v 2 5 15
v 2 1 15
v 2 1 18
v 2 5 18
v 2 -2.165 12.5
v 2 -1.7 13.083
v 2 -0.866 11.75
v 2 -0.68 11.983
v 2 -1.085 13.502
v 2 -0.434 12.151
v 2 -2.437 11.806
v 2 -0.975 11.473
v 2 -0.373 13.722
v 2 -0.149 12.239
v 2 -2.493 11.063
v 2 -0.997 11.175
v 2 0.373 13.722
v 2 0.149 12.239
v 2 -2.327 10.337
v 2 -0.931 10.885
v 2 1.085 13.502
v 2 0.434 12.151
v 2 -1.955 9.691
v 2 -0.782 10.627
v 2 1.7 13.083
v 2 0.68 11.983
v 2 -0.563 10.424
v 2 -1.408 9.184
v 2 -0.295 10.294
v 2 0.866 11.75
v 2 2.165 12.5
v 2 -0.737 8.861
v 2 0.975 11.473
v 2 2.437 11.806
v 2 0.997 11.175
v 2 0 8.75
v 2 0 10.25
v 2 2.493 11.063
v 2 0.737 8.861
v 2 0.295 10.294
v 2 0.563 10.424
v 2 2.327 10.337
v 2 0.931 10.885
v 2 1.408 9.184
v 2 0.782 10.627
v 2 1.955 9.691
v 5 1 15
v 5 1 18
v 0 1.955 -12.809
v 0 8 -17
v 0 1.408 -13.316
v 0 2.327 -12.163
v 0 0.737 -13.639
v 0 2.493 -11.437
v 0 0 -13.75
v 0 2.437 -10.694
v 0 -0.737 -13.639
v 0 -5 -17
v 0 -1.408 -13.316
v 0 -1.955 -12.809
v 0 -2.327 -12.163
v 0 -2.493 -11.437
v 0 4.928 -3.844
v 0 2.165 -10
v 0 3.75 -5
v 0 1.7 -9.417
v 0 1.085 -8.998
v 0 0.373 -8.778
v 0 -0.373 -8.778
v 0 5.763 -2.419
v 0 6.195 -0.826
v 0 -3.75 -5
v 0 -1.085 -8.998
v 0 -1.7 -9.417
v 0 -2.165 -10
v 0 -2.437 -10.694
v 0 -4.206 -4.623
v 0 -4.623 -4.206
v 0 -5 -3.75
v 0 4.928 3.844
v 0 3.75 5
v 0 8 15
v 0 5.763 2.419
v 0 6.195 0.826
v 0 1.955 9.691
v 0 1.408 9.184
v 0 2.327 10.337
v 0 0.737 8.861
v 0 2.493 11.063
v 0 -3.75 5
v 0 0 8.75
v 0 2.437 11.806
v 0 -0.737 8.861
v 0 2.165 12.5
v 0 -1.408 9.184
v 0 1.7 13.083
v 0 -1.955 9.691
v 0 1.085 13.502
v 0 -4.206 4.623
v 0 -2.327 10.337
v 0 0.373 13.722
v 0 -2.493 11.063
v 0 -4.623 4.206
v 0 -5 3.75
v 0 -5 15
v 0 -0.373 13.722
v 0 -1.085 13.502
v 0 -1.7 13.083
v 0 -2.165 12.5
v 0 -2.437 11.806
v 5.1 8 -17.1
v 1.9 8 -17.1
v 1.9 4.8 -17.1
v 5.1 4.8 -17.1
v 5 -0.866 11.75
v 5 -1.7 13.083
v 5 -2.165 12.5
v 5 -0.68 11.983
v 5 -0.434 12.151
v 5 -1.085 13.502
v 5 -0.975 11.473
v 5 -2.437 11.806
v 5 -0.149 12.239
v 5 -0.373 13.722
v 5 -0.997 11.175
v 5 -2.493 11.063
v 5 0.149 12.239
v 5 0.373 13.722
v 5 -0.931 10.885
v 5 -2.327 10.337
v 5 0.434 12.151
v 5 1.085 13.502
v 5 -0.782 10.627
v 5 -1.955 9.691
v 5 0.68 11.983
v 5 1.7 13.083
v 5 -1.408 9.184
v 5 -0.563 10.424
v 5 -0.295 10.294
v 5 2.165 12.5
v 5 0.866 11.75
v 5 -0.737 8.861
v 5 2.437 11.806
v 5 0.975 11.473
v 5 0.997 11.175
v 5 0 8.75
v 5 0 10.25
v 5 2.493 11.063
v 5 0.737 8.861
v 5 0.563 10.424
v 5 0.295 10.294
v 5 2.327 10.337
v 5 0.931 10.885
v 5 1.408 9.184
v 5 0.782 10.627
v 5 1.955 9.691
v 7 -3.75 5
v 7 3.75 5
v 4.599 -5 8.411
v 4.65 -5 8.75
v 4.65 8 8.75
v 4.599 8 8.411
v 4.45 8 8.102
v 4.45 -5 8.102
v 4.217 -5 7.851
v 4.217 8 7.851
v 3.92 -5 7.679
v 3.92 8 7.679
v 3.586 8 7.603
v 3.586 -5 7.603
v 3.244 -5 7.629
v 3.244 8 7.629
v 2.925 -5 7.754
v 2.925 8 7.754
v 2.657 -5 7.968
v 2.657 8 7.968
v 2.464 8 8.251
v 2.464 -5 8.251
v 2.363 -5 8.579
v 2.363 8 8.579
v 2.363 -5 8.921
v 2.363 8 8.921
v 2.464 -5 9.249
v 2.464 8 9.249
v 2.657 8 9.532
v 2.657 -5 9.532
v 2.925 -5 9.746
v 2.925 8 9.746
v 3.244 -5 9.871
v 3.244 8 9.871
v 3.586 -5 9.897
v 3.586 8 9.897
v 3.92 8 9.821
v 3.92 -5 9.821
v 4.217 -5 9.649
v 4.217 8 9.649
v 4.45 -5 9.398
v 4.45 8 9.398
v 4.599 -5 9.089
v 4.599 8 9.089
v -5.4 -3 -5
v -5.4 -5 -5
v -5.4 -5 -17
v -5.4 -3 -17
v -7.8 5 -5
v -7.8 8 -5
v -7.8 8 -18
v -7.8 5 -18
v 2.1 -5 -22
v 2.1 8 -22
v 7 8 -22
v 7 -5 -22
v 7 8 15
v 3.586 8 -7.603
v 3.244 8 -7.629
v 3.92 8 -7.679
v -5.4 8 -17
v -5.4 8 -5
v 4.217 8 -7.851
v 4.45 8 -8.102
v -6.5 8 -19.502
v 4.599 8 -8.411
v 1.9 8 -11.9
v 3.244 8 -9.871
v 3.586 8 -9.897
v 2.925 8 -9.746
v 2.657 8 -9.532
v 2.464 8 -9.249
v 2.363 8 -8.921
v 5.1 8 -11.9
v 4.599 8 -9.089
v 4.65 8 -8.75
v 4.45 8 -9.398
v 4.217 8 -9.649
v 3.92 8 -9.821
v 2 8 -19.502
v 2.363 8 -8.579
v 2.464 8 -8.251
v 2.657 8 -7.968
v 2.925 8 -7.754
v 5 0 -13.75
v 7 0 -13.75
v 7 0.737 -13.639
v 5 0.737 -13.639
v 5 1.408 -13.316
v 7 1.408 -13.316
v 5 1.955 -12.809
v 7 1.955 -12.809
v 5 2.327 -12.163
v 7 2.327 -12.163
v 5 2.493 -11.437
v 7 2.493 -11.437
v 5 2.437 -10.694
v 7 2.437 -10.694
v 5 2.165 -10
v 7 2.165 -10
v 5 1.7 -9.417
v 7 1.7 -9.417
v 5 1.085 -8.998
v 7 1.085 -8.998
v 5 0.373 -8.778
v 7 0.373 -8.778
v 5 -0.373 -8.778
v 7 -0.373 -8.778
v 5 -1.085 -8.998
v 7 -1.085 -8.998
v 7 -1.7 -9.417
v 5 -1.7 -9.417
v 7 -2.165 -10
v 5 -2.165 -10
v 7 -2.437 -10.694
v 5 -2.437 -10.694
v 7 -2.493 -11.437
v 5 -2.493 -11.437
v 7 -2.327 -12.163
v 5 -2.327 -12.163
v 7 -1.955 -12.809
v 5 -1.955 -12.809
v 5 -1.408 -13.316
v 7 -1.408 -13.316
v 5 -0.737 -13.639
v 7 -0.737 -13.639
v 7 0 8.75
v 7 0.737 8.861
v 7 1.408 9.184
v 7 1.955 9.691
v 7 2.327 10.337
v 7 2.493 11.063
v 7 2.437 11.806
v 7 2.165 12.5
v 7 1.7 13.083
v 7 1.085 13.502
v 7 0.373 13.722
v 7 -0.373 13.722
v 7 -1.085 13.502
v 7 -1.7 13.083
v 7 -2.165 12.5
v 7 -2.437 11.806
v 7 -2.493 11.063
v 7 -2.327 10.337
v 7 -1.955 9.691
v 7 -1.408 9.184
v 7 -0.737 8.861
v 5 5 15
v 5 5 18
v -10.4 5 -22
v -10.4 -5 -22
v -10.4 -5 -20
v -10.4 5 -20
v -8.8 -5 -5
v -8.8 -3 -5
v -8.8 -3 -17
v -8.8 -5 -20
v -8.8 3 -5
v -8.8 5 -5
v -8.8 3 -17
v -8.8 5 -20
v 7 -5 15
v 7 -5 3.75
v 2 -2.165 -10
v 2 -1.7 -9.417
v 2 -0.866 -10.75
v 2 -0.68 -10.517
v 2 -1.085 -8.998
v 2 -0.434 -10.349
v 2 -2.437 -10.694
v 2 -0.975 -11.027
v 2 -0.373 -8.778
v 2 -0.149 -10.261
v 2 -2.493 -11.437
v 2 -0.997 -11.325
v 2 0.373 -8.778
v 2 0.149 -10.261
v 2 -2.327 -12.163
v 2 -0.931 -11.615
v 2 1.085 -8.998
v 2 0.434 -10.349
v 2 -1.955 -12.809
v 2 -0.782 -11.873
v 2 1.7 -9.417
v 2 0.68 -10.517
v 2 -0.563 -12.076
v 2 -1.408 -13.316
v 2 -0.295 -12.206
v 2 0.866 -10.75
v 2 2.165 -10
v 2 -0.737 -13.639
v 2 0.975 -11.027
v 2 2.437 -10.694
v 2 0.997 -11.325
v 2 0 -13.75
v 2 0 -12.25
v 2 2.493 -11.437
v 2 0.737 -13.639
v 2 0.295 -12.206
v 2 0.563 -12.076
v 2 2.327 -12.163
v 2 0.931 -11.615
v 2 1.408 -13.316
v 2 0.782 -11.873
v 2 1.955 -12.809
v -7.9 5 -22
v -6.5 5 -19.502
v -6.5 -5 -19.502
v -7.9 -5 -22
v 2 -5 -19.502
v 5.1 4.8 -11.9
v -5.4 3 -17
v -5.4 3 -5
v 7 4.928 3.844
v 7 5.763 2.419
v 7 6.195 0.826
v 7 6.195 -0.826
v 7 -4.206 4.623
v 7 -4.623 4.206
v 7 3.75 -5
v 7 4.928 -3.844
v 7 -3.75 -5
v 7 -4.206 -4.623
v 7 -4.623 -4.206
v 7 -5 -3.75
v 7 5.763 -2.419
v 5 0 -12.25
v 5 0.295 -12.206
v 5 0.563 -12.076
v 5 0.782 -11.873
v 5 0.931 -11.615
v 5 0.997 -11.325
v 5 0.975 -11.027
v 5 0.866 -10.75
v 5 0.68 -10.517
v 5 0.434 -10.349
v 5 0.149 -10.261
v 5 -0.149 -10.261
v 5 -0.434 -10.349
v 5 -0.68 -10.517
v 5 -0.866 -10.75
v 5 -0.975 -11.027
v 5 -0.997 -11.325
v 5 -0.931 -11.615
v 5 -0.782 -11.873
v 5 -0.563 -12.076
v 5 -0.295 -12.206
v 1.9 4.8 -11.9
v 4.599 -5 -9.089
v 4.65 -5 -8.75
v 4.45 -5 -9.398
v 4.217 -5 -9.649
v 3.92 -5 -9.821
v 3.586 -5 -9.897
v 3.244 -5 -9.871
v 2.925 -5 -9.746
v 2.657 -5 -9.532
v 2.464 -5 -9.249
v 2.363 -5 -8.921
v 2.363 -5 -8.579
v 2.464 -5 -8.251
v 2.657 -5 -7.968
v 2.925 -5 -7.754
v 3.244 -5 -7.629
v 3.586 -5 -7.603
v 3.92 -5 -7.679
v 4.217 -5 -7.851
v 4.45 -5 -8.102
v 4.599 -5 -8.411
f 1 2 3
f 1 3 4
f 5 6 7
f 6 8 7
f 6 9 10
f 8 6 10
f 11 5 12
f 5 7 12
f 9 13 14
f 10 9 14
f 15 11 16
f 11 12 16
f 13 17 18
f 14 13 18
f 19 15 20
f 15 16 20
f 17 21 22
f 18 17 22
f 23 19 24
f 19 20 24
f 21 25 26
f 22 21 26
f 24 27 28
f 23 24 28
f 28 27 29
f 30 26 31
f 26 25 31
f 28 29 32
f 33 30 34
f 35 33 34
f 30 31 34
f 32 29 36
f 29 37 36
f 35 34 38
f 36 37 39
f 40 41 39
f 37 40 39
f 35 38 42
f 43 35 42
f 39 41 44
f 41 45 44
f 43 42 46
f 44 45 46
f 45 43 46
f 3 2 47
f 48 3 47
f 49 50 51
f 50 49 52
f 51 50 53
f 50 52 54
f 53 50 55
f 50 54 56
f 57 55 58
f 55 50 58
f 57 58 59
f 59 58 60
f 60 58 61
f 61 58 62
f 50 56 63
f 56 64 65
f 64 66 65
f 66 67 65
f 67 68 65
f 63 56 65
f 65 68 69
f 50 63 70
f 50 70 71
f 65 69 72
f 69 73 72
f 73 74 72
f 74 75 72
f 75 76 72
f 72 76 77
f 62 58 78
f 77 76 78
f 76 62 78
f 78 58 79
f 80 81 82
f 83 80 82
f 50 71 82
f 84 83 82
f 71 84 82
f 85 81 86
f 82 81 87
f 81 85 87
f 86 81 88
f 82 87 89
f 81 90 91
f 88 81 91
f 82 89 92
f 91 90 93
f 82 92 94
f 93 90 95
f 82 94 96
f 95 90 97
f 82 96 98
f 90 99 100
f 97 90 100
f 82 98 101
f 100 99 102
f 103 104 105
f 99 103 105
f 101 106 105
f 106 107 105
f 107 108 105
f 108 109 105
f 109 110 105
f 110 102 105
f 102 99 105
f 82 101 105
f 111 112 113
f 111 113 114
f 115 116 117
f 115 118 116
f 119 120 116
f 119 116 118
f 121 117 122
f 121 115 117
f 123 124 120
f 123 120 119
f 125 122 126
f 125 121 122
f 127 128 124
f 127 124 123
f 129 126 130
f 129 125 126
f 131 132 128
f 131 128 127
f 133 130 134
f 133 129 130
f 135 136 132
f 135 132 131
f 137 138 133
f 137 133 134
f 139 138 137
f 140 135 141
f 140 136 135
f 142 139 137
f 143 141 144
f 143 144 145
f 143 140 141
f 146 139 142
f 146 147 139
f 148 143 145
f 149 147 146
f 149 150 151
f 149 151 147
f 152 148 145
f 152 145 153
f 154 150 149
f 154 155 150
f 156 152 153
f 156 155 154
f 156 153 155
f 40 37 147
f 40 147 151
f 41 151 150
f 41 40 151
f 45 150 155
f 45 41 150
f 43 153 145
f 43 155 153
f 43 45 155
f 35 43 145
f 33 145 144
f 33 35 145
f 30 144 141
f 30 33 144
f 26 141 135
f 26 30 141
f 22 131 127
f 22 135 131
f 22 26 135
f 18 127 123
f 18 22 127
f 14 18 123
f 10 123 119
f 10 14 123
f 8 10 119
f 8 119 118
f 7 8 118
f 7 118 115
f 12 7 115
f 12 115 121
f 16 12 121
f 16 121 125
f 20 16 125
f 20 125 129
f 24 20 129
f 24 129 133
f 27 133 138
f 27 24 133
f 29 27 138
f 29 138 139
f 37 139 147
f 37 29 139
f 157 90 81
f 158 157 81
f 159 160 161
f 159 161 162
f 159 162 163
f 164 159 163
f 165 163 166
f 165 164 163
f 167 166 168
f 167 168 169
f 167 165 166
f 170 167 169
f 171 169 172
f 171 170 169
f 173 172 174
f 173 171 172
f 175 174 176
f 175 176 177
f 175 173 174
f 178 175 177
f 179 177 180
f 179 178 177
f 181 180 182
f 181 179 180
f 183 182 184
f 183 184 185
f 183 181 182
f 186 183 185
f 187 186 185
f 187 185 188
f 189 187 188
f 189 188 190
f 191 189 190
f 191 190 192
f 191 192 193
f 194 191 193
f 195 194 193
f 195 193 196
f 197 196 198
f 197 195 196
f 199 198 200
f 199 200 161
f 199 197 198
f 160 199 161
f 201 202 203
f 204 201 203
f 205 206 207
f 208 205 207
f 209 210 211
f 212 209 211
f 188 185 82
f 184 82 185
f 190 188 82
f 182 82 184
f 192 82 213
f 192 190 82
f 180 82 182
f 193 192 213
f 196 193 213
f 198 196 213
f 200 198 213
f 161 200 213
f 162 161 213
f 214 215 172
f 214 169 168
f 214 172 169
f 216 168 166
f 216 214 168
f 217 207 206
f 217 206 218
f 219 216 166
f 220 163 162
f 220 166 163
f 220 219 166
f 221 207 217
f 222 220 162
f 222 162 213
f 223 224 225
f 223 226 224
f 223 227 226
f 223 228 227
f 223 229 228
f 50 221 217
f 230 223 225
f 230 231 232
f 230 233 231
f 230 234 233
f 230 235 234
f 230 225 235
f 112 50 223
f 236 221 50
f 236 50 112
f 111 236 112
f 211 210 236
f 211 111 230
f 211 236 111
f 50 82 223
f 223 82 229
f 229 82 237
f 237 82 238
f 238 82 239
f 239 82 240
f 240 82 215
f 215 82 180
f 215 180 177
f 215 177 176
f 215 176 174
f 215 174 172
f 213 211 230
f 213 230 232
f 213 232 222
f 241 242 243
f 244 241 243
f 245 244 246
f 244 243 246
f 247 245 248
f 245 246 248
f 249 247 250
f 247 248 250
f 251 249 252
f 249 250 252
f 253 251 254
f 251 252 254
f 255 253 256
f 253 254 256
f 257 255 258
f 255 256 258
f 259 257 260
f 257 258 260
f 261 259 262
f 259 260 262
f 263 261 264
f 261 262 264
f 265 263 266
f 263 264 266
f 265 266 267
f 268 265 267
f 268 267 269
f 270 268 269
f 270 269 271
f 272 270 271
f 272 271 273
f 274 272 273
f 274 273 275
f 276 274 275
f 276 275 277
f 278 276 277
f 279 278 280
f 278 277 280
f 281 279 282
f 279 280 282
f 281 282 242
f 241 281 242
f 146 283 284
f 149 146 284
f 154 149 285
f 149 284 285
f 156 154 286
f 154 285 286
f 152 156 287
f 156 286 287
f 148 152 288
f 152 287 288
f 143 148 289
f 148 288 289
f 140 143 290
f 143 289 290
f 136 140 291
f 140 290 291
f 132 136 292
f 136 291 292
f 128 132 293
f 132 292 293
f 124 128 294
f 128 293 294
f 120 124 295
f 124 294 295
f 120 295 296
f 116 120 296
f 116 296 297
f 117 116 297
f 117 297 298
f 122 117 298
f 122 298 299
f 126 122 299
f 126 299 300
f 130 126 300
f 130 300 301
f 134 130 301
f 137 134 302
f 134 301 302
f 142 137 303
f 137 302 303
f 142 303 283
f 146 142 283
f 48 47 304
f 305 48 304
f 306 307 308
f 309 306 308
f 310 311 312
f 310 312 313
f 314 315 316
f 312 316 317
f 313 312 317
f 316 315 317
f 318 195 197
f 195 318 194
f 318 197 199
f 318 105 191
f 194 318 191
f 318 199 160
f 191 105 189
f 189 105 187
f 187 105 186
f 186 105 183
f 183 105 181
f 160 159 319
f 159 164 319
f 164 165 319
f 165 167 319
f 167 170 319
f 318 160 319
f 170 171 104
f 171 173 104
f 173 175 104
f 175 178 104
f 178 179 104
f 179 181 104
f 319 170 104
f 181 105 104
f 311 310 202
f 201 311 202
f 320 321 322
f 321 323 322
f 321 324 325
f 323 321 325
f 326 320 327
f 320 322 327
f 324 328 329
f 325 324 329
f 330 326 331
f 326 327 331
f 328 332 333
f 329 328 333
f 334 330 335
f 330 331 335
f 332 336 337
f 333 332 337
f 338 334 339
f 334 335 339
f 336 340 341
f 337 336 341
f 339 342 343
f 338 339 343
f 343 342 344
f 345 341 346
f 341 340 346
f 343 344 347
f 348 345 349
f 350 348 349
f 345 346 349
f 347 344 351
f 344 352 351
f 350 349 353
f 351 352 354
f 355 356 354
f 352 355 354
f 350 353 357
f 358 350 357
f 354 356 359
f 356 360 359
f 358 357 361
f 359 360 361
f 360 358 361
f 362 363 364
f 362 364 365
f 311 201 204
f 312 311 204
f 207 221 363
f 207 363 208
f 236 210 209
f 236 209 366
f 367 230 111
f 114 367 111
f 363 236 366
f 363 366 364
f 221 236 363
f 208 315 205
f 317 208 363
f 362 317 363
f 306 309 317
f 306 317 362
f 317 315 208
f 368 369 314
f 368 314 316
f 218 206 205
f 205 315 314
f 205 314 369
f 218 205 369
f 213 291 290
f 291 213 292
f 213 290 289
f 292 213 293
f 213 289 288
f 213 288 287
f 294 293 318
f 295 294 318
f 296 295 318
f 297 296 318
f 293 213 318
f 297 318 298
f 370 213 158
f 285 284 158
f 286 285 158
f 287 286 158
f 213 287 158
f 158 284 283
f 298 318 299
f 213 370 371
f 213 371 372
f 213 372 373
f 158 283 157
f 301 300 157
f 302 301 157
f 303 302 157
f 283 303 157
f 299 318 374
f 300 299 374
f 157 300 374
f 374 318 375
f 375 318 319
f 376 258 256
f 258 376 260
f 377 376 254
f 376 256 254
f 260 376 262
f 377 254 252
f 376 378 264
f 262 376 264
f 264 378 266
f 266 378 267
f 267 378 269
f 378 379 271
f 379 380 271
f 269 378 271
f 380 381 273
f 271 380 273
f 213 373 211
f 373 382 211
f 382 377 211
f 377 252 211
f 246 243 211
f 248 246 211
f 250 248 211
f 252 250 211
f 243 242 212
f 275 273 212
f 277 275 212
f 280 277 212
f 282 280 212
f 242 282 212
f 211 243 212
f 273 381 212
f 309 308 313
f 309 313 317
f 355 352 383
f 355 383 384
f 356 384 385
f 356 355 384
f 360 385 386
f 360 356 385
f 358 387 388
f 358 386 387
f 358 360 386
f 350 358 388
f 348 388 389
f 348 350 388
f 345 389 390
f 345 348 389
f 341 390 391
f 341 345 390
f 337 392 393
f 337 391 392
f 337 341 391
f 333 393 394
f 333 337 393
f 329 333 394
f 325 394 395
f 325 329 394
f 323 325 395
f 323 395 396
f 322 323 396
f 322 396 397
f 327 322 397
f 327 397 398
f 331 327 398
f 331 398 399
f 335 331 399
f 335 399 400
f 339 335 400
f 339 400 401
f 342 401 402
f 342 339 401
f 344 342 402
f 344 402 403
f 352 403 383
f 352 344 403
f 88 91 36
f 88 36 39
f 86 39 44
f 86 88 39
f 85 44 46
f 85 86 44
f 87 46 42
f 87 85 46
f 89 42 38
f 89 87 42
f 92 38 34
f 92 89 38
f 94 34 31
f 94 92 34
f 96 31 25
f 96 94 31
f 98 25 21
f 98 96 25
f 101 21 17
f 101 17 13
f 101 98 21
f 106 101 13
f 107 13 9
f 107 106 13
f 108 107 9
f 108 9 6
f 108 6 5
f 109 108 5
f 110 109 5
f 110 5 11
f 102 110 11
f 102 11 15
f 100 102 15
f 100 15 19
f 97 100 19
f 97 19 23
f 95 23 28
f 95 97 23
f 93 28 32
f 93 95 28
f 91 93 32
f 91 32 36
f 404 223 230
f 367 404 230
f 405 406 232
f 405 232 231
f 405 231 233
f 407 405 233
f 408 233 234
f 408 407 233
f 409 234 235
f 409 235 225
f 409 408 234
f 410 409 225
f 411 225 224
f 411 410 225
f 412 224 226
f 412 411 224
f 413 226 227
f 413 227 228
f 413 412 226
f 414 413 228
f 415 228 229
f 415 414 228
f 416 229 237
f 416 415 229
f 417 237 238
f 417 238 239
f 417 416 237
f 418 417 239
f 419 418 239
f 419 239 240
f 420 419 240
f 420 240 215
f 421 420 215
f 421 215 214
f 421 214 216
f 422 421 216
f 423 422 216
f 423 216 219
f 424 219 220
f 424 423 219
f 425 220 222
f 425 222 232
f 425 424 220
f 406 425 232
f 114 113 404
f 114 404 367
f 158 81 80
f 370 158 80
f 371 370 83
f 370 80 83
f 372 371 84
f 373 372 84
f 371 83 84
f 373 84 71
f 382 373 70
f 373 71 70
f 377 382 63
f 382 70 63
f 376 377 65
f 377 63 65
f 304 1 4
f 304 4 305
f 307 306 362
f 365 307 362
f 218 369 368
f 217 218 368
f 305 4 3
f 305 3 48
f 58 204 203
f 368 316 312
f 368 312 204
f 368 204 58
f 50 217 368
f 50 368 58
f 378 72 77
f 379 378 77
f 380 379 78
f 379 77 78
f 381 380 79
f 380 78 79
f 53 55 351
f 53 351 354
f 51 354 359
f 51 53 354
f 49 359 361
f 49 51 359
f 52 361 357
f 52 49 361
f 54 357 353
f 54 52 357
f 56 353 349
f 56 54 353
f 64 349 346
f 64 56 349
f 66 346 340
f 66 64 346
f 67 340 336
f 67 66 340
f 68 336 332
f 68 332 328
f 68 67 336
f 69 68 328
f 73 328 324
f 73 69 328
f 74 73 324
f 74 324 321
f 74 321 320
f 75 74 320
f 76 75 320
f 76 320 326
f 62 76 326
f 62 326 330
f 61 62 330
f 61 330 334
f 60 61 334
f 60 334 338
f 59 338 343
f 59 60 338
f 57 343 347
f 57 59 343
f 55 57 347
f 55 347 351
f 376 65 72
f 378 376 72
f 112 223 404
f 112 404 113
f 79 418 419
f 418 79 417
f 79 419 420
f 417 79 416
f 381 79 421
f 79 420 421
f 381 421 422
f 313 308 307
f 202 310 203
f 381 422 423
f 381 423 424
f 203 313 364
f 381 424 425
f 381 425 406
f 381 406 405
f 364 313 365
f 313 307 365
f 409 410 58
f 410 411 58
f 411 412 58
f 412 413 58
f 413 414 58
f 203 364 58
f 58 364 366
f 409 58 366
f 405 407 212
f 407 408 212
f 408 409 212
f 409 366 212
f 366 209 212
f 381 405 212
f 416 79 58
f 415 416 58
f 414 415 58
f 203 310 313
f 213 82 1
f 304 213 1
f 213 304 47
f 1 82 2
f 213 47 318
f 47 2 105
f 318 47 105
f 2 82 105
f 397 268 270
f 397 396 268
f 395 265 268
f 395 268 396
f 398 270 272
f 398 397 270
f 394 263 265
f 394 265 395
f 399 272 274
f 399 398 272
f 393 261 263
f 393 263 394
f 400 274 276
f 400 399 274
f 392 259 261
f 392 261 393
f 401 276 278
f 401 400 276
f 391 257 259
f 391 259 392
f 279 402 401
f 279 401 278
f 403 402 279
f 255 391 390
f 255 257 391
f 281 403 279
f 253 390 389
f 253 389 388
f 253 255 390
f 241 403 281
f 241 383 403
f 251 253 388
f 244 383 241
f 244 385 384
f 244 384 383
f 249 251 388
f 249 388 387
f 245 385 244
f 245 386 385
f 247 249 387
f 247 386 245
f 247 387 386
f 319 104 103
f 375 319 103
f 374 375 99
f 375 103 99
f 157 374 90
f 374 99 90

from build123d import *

# Parameters (mm, degrees)
SKETCH2_R           = 1
BOSS_EXTRUDE1_DEPTH = 7
CUT_EXTRUDE1_START  = -5
SKETCH3_R           = 1.15
CUT_EXTRUDE1_DEPTH  = 13
SKETCH5_R           = 2.5
CUT_EXTRUDE2_DEPTH  = 2
CUT_EXTRUDE3_START  = 7
SKETCH5_2_R         = 2.5
CUT_EXTRUDE3_DEPTH  = 2
BOSS_EXTRUDE2_START = -5
BOSS_EXTRUDE2_DEPTH = 13
CUT_EXTRUDE4_START  = -5.4
SKETCH7_W           = 12
SKETCH7_H           = 6
CUT_EXTRUDE4_DEPTH  = 5
CUT_EXTRUDE5_START  = -10.4
SKETCH8_W           = 15
SKETCH8_H           = 13
CUT_EXTRUDE5_DEPTH  = 1.6
CUT_EXTRUDE6_START  = -8.8
SKETCH9_W           = 13
SKETCH9_H           = 3
CUT_EXTRUDE6_DEPTH  = 1
BOSS_EXTRUDE4_START = 8
SKETCH10_W          = 5.4
SKETCH10_H          = 5
BOSS_EXTRUDE4_DEPTH = 13
CUT_EXTRUDE7_START  = 8
SKETCH11_W          = 17.4
SKETCH11_H          = 3
CUT_EXTRUDE7_DEPTH  = 13
BOSS_EXTRUDE5_START = 15
SKETCH12_W          = 3
SKETCH12_H          = 4
BOSS_EXTRUDE5_DEPTH = 3
CUT_EXTRUDE8_START  = 8
CUT_EXTRUDE8_DEPTH  = 13
CUT_EXTRUDE9_START  = 8
CUT_EXTRUDE9_DEPTH  = 3
CUT_EXTRUDE10_START = 8
SKETCH15_W          = 3.2
SKETCH15_H          = 5.2
CUT_EXTRUDE10_DEPTH = 3.2


with BuildPart() as part:
    # Sketch2 → Boss-Extrude1 (new body)
    with BuildSketch(Plane(origin=(0, 0, 0), x_dir=(0, 0, -1), z_dir=(1, 0, 0))):
        with BuildLine():
            Line((3.75, -5), (15, -5))
            Line((15, -5), (15, 8))
            Line((15, 8), (-15, 8))
            Line((-15, 8), (-15, -5))
            Line((-15, -5), (-3.75, -5))
            ThreePointArc((-3.75, -5), (-4.419417382, -4.419417382), (-5, -3.75))
            Line((-5, -3.75), (-5, 3.75))
            ThreePointArc((-5, 3.75), (0, 6.25), (5, 3.75))
            Line((5, 3.75), (5, -3.75))
            ThreePointArc((5, -3.75), (4.419417382, -4.419417382), (3.75, -5))
        make_face()
        with Locations((-11.25, 0)):
            Circle(SKETCH2_R, mode=Mode.SUBTRACT)
        with Locations((11.25, 0)):
            Circle(SKETCH2_R, mode=Mode.SUBTRACT)
    extrude(amount=BOSS_EXTRUDE1_DEPTH)

    # Sketch3 → Cut-Extrude1 (cut)
    with BuildSketch(Plane(origin=(0, 0, 0), x_dir=(1, 0, 0), z_dir=(0, 1, 0)).offset(CUT_EXTRUDE1_START)):
        with Locations((3.5, 8.75)):
            Circle(SKETCH3_R)
        with Locations((3.5, -8.75)):
            Circle(SKETCH3_R)
    extrude(amount=CUT_EXTRUDE1_DEPTH, mode=Mode.SUBTRACT)

    # Sketch5 → Cut-Extrude2 (cut)
    with BuildSketch(Plane(origin=(0, 0, 0), x_dir=(0, 0, -1), z_dir=(1, 0, 0))):
        with Locations((11.25, 0)):
            Circle(SKETCH5_R)
        with Locations((-11.25, 0)):
            Circle(SKETCH5_R)
    extrude(amount=CUT_EXTRUDE2_DEPTH, mode=Mode.SUBTRACT)

    # Sketch5<2> → Cut-Extrude3 (cut)
    with BuildSketch(Plane(origin=(0, 0, 0), x_dir=(0, 0, -1), z_dir=(1, 0, 0)).offset(CUT_EXTRUDE3_START)):
        with Locations((11.25, 0)):
            Circle(SKETCH5_2_R)
        with Locations((-11.25, 0)):
            Circle(SKETCH5_2_R)
    extrude(amount=-CUT_EXTRUDE3_DEPTH, mode=Mode.SUBTRACT)

    # Sketch6 → Boss-Extrude2 (add)
    with BuildSketch(Plane(origin=(0, 0, 0), x_dir=(1, 0, 0), z_dir=(0, 1, 0)).offset(BOSS_EXTRUDE2_START)):
        Polygon((7, 15), (7, 25), (-10.4, 25), (-10.4, 5), (-5.4, 5), (-5.4, 22), (0, 22), (0, 15), align=None)
    extrude(amount=BOSS_EXTRUDE2_DEPTH)

    # Sketch7 → Cut-Extrude4 (cut)
    with BuildSketch(Plane(origin=(0, 0, 0), x_dir=(0, 0, -1), z_dir=(1, 0, 0)).offset(CUT_EXTRUDE4_START)):
        with Locations((11, 0)):
            Rectangle(SKETCH7_W, SKETCH7_H)
    extrude(amount=-CUT_EXTRUDE4_DEPTH, mode=Mode.SUBTRACT)

    # Sketch8 → Cut-Extrude5 (cut)
    with BuildSketch(Plane(origin=(0, 0, 0), x_dir=(0, 0, -1), z_dir=(1, 0, 0)).offset(CUT_EXTRUDE5_START)):
        with Locations((12.5, 1.5)):
            Rectangle(SKETCH8_W, SKETCH8_H)
    extrude(amount=CUT_EXTRUDE5_DEPTH, mode=Mode.SUBTRACT)

    # Sketch9 → Cut-Extrude6 (cut)
    with BuildSketch(Plane(origin=(0, 0, 0), x_dir=(0, 0, -1), z_dir=(1, 0, 0)).offset(CUT_EXTRUDE6_START)):
        with Locations((11.5, 6.5)):
            Rectangle(SKETCH9_W, SKETCH9_H)
    extrude(amount=CUT_EXTRUDE6_DEPTH, mode=Mode.SUBTRACT)

    # Sketch10 → Boss-Extrude4 (add)
    with BuildSketch(Plane(origin=(0, 0, 0), x_dir=(1, 0, 0), z_dir=(0, 1, 0)).offset(BOSS_EXTRUDE4_START)):
        with Locations((-2.7, 19.5)):
            Rectangle(SKETCH10_W, SKETCH10_H)
    extrude(amount=-BOSS_EXTRUDE4_DEPTH)

    # Sketch11 → Cut-Extrude7 (cut)
    with BuildSketch(Plane(origin=(0, 0, 0), x_dir=(1, 0, 0), z_dir=(0, 1, 0)).offset(CUT_EXTRUDE7_START)):
        with Locations((-1.7, 23.5)):
            Rectangle(SKETCH11_W, SKETCH11_H)
    extrude(amount=-CUT_EXTRUDE7_DEPTH, mode=Mode.SUBTRACT)

    # Sketch12 → Boss-Extrude5 (add)
    with BuildSketch(Plane.XY.offset(BOSS_EXTRUDE5_START)):
        with Locations((3.5, 3)):
            Rectangle(SKETCH12_W, SKETCH12_H)
    extrude(amount=BOSS_EXTRUDE5_DEPTH)

    # Sketch13 → Cut-Extrude8 (cut)
    with BuildSketch(Plane(origin=(0, 0, 0), x_dir=(1, 0, 0), z_dir=(0, 1, 0)).offset(CUT_EXTRUDE8_START)):
        Polygon((2.1, 22), (2.000079904, 19.501997603), (-6.499920096, 19.501997603), (-7.9, 22), align=None)
    extrude(amount=-CUT_EXTRUDE8_DEPTH, mode=Mode.SUBTRACT)

    # Sketch14 → Cut-Extrude9 (cut)
    with BuildSketch(Plane(origin=(0, 0, 0), x_dir=(1, 0, 0), z_dir=(0, 1, 0)).offset(CUT_EXTRUDE9_START)):
        Polygon((-6.499920096, 19.501997603), (-7.8, 18), (-8.8, 18), (-8.8, 20), (-10.4, 20), (-10.4, 22), (-7.9, 22), align=None)
    extrude(amount=-CUT_EXTRUDE9_DEPTH, mode=Mode.SUBTRACT)

    # Sketch15 → Cut-Extrude10 (cut)
    with BuildSketch(Plane(origin=(0, 0, 0), x_dir=(1, 0, 0), z_dir=(0, 1, 0)).offset(CUT_EXTRUDE10_START)):
        with Locations((3.5, 14.5)):
            Rectangle(SKETCH15_W, SKETCH15_H)
    extrude(amount=-CUT_EXTRUDE10_DEPTH, mode=Mode.SUBTRACT)


solid = part.part
